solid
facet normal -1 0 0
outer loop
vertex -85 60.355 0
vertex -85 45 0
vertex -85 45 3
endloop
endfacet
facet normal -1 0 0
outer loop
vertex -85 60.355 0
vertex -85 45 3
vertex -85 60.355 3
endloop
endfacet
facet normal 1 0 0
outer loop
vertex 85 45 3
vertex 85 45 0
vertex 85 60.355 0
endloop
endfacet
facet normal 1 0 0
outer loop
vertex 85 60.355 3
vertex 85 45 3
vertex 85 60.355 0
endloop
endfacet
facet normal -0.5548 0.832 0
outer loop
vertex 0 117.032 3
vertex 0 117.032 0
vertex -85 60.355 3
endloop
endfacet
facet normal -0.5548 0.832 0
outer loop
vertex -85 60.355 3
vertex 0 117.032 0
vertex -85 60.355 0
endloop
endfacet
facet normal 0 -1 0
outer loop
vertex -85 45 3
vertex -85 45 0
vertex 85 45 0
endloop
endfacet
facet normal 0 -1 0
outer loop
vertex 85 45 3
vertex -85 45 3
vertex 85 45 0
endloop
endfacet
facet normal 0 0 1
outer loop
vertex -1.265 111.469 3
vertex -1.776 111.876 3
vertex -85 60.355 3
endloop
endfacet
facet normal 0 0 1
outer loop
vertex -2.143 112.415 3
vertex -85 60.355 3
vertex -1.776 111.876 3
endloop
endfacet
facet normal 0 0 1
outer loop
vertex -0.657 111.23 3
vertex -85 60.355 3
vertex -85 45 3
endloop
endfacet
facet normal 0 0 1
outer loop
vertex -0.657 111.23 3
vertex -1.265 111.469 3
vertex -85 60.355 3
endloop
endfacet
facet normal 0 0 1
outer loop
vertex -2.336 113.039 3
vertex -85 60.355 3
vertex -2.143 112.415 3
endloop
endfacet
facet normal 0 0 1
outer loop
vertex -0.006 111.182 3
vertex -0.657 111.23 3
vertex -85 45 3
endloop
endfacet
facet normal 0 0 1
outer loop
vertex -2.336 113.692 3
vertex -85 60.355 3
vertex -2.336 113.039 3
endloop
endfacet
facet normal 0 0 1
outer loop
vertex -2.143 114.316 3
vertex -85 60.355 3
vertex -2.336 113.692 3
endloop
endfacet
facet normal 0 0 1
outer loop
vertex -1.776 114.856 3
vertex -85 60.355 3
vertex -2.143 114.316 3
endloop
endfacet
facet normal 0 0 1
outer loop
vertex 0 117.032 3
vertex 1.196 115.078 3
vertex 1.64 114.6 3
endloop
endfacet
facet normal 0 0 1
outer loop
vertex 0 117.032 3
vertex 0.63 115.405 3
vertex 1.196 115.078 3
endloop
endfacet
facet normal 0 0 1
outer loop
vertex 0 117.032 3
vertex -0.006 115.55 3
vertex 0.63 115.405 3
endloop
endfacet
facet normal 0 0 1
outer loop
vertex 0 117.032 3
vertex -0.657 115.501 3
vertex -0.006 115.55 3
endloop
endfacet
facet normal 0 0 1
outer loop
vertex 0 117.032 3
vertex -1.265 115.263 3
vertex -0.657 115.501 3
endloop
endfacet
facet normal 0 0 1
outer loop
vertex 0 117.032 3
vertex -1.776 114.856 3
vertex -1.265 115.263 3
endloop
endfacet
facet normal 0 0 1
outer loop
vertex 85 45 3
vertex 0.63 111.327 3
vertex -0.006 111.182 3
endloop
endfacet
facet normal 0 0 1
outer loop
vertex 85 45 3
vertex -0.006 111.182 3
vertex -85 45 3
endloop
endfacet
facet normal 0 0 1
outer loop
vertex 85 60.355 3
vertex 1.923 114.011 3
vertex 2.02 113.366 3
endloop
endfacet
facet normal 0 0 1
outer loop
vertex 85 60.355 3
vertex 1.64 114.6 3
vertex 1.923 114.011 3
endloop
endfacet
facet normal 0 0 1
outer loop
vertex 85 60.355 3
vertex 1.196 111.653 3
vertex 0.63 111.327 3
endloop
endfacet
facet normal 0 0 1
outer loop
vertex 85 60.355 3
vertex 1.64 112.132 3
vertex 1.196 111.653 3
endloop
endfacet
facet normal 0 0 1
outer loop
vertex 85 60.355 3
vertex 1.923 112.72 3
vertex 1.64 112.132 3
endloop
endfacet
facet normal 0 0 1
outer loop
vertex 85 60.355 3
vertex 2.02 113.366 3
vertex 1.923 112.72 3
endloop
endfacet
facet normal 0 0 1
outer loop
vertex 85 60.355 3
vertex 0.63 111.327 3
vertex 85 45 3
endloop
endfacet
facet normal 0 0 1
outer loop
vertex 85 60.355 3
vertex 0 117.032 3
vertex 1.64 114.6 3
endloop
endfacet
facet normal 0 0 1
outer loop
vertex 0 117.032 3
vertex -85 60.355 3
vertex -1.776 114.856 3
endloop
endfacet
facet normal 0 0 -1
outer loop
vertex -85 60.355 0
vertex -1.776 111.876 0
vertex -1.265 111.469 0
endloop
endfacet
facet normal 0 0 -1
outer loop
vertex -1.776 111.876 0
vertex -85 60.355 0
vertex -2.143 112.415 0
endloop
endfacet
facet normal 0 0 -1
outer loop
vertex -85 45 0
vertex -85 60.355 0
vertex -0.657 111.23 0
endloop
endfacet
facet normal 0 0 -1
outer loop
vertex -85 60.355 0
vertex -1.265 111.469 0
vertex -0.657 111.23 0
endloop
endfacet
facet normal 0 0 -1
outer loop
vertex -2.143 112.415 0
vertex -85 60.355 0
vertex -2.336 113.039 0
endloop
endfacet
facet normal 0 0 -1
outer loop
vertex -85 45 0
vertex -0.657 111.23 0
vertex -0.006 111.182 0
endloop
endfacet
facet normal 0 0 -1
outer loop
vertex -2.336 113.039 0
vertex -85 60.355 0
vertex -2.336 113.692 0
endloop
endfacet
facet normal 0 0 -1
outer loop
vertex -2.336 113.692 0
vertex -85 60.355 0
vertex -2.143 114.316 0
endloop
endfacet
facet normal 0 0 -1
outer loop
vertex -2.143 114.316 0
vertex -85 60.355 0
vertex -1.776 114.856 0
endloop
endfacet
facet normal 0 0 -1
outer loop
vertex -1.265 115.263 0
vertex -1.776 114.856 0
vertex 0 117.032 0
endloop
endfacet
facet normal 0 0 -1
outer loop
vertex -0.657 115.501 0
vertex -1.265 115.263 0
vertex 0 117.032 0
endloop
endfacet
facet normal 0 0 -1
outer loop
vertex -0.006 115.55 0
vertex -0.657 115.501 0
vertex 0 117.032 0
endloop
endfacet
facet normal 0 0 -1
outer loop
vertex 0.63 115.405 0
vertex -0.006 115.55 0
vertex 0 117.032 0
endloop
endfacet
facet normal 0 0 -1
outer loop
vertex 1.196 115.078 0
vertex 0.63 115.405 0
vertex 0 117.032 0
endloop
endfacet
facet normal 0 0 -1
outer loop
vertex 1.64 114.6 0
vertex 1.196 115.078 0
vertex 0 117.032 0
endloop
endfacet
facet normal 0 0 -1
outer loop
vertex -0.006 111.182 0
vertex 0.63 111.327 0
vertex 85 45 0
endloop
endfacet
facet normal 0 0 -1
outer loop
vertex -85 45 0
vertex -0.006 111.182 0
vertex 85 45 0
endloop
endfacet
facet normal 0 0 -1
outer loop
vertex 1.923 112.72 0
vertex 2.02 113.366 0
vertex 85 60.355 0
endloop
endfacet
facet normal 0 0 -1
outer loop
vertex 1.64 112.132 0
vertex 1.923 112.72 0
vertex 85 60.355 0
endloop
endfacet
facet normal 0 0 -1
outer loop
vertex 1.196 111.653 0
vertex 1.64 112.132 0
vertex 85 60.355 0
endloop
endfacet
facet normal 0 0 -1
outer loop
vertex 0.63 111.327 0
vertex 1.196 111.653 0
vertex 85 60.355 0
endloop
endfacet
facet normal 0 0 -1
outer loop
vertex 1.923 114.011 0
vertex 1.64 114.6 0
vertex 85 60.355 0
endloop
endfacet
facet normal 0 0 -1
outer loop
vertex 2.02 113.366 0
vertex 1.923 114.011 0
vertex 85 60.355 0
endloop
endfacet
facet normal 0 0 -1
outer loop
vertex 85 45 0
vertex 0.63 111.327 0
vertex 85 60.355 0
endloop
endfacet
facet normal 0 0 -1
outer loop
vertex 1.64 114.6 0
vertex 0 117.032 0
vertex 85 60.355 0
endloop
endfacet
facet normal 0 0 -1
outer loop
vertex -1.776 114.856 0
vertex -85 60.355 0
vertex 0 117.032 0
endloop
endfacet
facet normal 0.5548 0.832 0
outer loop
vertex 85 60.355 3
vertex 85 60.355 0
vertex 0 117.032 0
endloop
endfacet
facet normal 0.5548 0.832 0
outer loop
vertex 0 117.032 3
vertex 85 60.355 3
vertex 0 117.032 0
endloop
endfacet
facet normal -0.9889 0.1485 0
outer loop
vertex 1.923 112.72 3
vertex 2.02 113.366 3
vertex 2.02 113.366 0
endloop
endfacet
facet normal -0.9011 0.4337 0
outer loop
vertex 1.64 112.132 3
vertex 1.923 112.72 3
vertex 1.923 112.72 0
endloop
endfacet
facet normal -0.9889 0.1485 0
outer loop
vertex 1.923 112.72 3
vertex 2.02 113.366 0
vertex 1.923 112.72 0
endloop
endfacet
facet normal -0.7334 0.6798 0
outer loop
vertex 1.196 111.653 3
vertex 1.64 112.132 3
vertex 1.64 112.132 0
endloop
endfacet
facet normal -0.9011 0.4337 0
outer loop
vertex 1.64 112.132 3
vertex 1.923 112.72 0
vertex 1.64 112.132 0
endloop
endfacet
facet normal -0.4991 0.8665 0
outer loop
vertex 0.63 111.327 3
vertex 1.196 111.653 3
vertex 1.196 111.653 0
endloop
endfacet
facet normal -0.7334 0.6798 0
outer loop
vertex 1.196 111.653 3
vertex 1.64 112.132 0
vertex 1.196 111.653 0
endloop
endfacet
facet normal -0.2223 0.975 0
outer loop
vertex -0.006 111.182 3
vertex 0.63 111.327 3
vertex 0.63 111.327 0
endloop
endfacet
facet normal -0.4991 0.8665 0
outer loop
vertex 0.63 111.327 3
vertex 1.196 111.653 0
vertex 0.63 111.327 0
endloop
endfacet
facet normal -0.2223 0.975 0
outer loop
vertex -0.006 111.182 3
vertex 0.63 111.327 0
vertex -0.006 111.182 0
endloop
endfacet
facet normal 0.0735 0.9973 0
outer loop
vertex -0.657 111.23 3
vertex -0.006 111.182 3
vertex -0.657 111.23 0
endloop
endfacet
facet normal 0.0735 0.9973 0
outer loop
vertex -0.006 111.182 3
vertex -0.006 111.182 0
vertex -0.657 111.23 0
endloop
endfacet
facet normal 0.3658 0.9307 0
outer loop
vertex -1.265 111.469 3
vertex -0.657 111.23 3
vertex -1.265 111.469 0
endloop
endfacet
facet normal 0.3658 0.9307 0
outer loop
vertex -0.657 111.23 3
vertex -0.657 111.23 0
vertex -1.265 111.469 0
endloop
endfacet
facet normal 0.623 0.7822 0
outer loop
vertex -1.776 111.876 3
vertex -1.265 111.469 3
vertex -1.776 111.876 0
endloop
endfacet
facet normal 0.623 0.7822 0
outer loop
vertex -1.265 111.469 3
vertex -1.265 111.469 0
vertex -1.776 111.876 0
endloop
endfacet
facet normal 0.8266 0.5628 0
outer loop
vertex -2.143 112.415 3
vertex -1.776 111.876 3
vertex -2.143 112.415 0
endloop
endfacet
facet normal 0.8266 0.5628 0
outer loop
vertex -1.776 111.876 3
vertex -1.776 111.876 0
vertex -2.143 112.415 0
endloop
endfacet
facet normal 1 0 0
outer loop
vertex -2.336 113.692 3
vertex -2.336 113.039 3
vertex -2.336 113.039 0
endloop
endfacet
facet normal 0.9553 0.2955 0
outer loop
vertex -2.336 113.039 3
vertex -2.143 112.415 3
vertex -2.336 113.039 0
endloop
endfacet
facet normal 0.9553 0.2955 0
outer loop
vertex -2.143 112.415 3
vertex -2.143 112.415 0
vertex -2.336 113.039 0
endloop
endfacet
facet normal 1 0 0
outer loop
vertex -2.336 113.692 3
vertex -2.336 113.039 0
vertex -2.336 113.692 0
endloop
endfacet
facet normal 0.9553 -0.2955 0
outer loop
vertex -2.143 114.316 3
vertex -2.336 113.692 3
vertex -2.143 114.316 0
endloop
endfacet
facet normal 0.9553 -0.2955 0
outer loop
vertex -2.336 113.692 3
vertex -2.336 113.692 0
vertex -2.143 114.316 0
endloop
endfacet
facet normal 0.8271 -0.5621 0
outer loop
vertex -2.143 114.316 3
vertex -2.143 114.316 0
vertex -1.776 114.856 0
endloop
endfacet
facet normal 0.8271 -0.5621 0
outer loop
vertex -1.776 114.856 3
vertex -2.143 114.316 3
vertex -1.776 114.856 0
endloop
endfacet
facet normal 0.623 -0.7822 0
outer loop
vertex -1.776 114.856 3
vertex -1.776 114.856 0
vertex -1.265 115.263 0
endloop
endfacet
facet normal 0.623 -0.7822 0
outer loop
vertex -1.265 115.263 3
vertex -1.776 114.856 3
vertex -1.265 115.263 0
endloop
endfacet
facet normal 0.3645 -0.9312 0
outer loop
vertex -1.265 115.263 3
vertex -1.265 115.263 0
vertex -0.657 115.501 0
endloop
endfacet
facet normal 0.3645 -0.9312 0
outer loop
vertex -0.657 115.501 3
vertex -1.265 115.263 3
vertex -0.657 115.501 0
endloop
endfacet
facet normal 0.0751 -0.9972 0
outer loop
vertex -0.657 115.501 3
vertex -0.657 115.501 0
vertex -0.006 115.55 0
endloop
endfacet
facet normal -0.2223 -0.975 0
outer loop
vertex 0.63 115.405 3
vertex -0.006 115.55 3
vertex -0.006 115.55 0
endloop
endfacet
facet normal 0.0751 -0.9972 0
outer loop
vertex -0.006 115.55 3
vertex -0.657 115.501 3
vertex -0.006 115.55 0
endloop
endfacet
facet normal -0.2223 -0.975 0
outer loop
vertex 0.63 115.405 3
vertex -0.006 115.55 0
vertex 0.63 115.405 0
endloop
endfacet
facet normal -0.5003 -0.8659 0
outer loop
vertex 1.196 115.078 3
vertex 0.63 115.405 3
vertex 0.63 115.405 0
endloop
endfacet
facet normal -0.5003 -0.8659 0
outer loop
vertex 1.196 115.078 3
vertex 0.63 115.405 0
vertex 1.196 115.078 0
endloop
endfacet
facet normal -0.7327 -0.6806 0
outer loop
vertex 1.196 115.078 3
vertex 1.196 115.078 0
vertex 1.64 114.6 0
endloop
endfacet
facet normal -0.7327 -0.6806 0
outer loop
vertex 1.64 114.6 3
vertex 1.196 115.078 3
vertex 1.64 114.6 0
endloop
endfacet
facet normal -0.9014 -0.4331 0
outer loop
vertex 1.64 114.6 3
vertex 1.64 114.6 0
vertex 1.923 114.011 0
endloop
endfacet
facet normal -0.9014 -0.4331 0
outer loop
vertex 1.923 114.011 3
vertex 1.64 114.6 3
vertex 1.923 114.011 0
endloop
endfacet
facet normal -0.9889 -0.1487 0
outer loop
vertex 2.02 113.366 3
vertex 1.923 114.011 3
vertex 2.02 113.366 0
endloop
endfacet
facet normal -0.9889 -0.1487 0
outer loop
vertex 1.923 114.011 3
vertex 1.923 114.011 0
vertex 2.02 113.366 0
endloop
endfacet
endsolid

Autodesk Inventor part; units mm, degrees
ref_plane "YZ Plane" through (0, 0, 0) normal (1, 0, 0) x (0, 1, 0)
ref_plane "XZ Plane" through (0, 0, 0) normal (0, 1, 0) x (-1, 0, 0)
ref_plane "XY Plane" through (0, 0, 0) normal (0, 0, 1) x (1, 0, 0)
sketch "Boceto1" plane through (0, 0, 0) normal (0, 0, 1) x (1, 0, 0)
  arc A0 (-1.5, 113.1763) -> (1.5, 113.1763) centre (0, 113.1763) ccw
  line L0 (0, 113.1763) -> (0, 116.1763)
  line L1 (-75, 45) -> (75, 45) projected
  line L2 (75, 45) -> (85, 45)
  line L3 (-75, 45) -> (-85, 45)
  line L4 (0, 117.735) -> (-0.0114, 117.7429)
  line L5 (-85, 55) -> (0, 111.6763) projected
  line L6 (0, 111.6763) -> (85, 55) projected
  line L7 (-2.22, 113.8018) -> (0.2156, 115.4258) projected
  line L8 (1.8799, 112.9298) -> (0.2156, 115.4258) projected
  line L9 (-0.5557, 111.3058) -> (1.8799, 112.9298) projected
  line L10 (1.8799, 112.9298) -> (0.2156, 115.4258) projected
  line L11 (-2.22, 113.8018) -> (0.2156, 115.4258) projected
  line L12 (-0.5557, 111.3058) -> (-2.22, 113.8018) projected
  line L13 (-2.22, 113.8018) -> (1.8799, 112.9298)
  line L14 (-0.5557, 111.3058) -> (0.2156, 115.4258)
  circle A1 centre (-0.17, 113.3658) radius 2.0958
  line L15 (85, 45) -> (85, 59.843)
  line L16 (-85, 45) -> (-85, 59.843)
  circle A2 centre (-0.17, 113.3658) radius 2.1904
  line L17 (0, 117.0317) -> (-85, 60.3554) projected
  line L18 (85, 60.3554) -> (0, 117.0317) projected
  line L19 (-85, 60.3554) -> (-85, 45) projected
  line L20 (85, 45) -> (85, 60.3554) projected
  point P0 (0, 0)
  point P1 (96.4858, 46.8907)
  point P2 (-94.6783, 48.1668)
  point P3 (-94.6783, 45)
  point P4 (96.4858, 45)
  dimension "d0" = 3
extrude "Extrusión1" add sketch "Boceto1" along normal blind 3 contours A2 L6 L15 L2 L1 L3 L16 L5 | L5 L16 L19 L17 L18 L20 L15 L6 A2
